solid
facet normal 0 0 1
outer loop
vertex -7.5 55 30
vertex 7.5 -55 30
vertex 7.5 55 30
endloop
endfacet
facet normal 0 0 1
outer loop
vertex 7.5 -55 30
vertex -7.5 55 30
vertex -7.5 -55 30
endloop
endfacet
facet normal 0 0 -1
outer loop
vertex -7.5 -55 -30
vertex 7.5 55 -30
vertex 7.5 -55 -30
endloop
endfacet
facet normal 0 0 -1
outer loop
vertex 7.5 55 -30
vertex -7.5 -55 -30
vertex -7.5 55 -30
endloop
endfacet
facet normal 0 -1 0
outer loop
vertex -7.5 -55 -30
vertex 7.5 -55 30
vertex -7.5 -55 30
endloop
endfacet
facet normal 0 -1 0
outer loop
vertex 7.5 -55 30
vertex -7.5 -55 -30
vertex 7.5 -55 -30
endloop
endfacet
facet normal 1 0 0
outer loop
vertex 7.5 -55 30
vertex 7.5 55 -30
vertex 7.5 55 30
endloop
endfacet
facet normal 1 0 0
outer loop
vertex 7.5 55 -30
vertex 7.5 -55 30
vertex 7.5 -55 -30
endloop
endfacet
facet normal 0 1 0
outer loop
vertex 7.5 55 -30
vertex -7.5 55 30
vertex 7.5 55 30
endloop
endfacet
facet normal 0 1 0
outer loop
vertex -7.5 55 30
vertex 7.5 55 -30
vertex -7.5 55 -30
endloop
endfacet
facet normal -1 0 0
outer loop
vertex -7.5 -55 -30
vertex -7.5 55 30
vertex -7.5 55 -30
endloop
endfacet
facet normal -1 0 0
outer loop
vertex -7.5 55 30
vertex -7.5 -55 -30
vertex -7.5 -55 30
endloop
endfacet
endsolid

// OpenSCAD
// ========================================
// a 15 x 110 x 60 mm box
// NeuroCAD canonical IR; dimensions are millimetres
// ========================================
$fn = 48;

cube(size=[15, 110, 60], center=true);
